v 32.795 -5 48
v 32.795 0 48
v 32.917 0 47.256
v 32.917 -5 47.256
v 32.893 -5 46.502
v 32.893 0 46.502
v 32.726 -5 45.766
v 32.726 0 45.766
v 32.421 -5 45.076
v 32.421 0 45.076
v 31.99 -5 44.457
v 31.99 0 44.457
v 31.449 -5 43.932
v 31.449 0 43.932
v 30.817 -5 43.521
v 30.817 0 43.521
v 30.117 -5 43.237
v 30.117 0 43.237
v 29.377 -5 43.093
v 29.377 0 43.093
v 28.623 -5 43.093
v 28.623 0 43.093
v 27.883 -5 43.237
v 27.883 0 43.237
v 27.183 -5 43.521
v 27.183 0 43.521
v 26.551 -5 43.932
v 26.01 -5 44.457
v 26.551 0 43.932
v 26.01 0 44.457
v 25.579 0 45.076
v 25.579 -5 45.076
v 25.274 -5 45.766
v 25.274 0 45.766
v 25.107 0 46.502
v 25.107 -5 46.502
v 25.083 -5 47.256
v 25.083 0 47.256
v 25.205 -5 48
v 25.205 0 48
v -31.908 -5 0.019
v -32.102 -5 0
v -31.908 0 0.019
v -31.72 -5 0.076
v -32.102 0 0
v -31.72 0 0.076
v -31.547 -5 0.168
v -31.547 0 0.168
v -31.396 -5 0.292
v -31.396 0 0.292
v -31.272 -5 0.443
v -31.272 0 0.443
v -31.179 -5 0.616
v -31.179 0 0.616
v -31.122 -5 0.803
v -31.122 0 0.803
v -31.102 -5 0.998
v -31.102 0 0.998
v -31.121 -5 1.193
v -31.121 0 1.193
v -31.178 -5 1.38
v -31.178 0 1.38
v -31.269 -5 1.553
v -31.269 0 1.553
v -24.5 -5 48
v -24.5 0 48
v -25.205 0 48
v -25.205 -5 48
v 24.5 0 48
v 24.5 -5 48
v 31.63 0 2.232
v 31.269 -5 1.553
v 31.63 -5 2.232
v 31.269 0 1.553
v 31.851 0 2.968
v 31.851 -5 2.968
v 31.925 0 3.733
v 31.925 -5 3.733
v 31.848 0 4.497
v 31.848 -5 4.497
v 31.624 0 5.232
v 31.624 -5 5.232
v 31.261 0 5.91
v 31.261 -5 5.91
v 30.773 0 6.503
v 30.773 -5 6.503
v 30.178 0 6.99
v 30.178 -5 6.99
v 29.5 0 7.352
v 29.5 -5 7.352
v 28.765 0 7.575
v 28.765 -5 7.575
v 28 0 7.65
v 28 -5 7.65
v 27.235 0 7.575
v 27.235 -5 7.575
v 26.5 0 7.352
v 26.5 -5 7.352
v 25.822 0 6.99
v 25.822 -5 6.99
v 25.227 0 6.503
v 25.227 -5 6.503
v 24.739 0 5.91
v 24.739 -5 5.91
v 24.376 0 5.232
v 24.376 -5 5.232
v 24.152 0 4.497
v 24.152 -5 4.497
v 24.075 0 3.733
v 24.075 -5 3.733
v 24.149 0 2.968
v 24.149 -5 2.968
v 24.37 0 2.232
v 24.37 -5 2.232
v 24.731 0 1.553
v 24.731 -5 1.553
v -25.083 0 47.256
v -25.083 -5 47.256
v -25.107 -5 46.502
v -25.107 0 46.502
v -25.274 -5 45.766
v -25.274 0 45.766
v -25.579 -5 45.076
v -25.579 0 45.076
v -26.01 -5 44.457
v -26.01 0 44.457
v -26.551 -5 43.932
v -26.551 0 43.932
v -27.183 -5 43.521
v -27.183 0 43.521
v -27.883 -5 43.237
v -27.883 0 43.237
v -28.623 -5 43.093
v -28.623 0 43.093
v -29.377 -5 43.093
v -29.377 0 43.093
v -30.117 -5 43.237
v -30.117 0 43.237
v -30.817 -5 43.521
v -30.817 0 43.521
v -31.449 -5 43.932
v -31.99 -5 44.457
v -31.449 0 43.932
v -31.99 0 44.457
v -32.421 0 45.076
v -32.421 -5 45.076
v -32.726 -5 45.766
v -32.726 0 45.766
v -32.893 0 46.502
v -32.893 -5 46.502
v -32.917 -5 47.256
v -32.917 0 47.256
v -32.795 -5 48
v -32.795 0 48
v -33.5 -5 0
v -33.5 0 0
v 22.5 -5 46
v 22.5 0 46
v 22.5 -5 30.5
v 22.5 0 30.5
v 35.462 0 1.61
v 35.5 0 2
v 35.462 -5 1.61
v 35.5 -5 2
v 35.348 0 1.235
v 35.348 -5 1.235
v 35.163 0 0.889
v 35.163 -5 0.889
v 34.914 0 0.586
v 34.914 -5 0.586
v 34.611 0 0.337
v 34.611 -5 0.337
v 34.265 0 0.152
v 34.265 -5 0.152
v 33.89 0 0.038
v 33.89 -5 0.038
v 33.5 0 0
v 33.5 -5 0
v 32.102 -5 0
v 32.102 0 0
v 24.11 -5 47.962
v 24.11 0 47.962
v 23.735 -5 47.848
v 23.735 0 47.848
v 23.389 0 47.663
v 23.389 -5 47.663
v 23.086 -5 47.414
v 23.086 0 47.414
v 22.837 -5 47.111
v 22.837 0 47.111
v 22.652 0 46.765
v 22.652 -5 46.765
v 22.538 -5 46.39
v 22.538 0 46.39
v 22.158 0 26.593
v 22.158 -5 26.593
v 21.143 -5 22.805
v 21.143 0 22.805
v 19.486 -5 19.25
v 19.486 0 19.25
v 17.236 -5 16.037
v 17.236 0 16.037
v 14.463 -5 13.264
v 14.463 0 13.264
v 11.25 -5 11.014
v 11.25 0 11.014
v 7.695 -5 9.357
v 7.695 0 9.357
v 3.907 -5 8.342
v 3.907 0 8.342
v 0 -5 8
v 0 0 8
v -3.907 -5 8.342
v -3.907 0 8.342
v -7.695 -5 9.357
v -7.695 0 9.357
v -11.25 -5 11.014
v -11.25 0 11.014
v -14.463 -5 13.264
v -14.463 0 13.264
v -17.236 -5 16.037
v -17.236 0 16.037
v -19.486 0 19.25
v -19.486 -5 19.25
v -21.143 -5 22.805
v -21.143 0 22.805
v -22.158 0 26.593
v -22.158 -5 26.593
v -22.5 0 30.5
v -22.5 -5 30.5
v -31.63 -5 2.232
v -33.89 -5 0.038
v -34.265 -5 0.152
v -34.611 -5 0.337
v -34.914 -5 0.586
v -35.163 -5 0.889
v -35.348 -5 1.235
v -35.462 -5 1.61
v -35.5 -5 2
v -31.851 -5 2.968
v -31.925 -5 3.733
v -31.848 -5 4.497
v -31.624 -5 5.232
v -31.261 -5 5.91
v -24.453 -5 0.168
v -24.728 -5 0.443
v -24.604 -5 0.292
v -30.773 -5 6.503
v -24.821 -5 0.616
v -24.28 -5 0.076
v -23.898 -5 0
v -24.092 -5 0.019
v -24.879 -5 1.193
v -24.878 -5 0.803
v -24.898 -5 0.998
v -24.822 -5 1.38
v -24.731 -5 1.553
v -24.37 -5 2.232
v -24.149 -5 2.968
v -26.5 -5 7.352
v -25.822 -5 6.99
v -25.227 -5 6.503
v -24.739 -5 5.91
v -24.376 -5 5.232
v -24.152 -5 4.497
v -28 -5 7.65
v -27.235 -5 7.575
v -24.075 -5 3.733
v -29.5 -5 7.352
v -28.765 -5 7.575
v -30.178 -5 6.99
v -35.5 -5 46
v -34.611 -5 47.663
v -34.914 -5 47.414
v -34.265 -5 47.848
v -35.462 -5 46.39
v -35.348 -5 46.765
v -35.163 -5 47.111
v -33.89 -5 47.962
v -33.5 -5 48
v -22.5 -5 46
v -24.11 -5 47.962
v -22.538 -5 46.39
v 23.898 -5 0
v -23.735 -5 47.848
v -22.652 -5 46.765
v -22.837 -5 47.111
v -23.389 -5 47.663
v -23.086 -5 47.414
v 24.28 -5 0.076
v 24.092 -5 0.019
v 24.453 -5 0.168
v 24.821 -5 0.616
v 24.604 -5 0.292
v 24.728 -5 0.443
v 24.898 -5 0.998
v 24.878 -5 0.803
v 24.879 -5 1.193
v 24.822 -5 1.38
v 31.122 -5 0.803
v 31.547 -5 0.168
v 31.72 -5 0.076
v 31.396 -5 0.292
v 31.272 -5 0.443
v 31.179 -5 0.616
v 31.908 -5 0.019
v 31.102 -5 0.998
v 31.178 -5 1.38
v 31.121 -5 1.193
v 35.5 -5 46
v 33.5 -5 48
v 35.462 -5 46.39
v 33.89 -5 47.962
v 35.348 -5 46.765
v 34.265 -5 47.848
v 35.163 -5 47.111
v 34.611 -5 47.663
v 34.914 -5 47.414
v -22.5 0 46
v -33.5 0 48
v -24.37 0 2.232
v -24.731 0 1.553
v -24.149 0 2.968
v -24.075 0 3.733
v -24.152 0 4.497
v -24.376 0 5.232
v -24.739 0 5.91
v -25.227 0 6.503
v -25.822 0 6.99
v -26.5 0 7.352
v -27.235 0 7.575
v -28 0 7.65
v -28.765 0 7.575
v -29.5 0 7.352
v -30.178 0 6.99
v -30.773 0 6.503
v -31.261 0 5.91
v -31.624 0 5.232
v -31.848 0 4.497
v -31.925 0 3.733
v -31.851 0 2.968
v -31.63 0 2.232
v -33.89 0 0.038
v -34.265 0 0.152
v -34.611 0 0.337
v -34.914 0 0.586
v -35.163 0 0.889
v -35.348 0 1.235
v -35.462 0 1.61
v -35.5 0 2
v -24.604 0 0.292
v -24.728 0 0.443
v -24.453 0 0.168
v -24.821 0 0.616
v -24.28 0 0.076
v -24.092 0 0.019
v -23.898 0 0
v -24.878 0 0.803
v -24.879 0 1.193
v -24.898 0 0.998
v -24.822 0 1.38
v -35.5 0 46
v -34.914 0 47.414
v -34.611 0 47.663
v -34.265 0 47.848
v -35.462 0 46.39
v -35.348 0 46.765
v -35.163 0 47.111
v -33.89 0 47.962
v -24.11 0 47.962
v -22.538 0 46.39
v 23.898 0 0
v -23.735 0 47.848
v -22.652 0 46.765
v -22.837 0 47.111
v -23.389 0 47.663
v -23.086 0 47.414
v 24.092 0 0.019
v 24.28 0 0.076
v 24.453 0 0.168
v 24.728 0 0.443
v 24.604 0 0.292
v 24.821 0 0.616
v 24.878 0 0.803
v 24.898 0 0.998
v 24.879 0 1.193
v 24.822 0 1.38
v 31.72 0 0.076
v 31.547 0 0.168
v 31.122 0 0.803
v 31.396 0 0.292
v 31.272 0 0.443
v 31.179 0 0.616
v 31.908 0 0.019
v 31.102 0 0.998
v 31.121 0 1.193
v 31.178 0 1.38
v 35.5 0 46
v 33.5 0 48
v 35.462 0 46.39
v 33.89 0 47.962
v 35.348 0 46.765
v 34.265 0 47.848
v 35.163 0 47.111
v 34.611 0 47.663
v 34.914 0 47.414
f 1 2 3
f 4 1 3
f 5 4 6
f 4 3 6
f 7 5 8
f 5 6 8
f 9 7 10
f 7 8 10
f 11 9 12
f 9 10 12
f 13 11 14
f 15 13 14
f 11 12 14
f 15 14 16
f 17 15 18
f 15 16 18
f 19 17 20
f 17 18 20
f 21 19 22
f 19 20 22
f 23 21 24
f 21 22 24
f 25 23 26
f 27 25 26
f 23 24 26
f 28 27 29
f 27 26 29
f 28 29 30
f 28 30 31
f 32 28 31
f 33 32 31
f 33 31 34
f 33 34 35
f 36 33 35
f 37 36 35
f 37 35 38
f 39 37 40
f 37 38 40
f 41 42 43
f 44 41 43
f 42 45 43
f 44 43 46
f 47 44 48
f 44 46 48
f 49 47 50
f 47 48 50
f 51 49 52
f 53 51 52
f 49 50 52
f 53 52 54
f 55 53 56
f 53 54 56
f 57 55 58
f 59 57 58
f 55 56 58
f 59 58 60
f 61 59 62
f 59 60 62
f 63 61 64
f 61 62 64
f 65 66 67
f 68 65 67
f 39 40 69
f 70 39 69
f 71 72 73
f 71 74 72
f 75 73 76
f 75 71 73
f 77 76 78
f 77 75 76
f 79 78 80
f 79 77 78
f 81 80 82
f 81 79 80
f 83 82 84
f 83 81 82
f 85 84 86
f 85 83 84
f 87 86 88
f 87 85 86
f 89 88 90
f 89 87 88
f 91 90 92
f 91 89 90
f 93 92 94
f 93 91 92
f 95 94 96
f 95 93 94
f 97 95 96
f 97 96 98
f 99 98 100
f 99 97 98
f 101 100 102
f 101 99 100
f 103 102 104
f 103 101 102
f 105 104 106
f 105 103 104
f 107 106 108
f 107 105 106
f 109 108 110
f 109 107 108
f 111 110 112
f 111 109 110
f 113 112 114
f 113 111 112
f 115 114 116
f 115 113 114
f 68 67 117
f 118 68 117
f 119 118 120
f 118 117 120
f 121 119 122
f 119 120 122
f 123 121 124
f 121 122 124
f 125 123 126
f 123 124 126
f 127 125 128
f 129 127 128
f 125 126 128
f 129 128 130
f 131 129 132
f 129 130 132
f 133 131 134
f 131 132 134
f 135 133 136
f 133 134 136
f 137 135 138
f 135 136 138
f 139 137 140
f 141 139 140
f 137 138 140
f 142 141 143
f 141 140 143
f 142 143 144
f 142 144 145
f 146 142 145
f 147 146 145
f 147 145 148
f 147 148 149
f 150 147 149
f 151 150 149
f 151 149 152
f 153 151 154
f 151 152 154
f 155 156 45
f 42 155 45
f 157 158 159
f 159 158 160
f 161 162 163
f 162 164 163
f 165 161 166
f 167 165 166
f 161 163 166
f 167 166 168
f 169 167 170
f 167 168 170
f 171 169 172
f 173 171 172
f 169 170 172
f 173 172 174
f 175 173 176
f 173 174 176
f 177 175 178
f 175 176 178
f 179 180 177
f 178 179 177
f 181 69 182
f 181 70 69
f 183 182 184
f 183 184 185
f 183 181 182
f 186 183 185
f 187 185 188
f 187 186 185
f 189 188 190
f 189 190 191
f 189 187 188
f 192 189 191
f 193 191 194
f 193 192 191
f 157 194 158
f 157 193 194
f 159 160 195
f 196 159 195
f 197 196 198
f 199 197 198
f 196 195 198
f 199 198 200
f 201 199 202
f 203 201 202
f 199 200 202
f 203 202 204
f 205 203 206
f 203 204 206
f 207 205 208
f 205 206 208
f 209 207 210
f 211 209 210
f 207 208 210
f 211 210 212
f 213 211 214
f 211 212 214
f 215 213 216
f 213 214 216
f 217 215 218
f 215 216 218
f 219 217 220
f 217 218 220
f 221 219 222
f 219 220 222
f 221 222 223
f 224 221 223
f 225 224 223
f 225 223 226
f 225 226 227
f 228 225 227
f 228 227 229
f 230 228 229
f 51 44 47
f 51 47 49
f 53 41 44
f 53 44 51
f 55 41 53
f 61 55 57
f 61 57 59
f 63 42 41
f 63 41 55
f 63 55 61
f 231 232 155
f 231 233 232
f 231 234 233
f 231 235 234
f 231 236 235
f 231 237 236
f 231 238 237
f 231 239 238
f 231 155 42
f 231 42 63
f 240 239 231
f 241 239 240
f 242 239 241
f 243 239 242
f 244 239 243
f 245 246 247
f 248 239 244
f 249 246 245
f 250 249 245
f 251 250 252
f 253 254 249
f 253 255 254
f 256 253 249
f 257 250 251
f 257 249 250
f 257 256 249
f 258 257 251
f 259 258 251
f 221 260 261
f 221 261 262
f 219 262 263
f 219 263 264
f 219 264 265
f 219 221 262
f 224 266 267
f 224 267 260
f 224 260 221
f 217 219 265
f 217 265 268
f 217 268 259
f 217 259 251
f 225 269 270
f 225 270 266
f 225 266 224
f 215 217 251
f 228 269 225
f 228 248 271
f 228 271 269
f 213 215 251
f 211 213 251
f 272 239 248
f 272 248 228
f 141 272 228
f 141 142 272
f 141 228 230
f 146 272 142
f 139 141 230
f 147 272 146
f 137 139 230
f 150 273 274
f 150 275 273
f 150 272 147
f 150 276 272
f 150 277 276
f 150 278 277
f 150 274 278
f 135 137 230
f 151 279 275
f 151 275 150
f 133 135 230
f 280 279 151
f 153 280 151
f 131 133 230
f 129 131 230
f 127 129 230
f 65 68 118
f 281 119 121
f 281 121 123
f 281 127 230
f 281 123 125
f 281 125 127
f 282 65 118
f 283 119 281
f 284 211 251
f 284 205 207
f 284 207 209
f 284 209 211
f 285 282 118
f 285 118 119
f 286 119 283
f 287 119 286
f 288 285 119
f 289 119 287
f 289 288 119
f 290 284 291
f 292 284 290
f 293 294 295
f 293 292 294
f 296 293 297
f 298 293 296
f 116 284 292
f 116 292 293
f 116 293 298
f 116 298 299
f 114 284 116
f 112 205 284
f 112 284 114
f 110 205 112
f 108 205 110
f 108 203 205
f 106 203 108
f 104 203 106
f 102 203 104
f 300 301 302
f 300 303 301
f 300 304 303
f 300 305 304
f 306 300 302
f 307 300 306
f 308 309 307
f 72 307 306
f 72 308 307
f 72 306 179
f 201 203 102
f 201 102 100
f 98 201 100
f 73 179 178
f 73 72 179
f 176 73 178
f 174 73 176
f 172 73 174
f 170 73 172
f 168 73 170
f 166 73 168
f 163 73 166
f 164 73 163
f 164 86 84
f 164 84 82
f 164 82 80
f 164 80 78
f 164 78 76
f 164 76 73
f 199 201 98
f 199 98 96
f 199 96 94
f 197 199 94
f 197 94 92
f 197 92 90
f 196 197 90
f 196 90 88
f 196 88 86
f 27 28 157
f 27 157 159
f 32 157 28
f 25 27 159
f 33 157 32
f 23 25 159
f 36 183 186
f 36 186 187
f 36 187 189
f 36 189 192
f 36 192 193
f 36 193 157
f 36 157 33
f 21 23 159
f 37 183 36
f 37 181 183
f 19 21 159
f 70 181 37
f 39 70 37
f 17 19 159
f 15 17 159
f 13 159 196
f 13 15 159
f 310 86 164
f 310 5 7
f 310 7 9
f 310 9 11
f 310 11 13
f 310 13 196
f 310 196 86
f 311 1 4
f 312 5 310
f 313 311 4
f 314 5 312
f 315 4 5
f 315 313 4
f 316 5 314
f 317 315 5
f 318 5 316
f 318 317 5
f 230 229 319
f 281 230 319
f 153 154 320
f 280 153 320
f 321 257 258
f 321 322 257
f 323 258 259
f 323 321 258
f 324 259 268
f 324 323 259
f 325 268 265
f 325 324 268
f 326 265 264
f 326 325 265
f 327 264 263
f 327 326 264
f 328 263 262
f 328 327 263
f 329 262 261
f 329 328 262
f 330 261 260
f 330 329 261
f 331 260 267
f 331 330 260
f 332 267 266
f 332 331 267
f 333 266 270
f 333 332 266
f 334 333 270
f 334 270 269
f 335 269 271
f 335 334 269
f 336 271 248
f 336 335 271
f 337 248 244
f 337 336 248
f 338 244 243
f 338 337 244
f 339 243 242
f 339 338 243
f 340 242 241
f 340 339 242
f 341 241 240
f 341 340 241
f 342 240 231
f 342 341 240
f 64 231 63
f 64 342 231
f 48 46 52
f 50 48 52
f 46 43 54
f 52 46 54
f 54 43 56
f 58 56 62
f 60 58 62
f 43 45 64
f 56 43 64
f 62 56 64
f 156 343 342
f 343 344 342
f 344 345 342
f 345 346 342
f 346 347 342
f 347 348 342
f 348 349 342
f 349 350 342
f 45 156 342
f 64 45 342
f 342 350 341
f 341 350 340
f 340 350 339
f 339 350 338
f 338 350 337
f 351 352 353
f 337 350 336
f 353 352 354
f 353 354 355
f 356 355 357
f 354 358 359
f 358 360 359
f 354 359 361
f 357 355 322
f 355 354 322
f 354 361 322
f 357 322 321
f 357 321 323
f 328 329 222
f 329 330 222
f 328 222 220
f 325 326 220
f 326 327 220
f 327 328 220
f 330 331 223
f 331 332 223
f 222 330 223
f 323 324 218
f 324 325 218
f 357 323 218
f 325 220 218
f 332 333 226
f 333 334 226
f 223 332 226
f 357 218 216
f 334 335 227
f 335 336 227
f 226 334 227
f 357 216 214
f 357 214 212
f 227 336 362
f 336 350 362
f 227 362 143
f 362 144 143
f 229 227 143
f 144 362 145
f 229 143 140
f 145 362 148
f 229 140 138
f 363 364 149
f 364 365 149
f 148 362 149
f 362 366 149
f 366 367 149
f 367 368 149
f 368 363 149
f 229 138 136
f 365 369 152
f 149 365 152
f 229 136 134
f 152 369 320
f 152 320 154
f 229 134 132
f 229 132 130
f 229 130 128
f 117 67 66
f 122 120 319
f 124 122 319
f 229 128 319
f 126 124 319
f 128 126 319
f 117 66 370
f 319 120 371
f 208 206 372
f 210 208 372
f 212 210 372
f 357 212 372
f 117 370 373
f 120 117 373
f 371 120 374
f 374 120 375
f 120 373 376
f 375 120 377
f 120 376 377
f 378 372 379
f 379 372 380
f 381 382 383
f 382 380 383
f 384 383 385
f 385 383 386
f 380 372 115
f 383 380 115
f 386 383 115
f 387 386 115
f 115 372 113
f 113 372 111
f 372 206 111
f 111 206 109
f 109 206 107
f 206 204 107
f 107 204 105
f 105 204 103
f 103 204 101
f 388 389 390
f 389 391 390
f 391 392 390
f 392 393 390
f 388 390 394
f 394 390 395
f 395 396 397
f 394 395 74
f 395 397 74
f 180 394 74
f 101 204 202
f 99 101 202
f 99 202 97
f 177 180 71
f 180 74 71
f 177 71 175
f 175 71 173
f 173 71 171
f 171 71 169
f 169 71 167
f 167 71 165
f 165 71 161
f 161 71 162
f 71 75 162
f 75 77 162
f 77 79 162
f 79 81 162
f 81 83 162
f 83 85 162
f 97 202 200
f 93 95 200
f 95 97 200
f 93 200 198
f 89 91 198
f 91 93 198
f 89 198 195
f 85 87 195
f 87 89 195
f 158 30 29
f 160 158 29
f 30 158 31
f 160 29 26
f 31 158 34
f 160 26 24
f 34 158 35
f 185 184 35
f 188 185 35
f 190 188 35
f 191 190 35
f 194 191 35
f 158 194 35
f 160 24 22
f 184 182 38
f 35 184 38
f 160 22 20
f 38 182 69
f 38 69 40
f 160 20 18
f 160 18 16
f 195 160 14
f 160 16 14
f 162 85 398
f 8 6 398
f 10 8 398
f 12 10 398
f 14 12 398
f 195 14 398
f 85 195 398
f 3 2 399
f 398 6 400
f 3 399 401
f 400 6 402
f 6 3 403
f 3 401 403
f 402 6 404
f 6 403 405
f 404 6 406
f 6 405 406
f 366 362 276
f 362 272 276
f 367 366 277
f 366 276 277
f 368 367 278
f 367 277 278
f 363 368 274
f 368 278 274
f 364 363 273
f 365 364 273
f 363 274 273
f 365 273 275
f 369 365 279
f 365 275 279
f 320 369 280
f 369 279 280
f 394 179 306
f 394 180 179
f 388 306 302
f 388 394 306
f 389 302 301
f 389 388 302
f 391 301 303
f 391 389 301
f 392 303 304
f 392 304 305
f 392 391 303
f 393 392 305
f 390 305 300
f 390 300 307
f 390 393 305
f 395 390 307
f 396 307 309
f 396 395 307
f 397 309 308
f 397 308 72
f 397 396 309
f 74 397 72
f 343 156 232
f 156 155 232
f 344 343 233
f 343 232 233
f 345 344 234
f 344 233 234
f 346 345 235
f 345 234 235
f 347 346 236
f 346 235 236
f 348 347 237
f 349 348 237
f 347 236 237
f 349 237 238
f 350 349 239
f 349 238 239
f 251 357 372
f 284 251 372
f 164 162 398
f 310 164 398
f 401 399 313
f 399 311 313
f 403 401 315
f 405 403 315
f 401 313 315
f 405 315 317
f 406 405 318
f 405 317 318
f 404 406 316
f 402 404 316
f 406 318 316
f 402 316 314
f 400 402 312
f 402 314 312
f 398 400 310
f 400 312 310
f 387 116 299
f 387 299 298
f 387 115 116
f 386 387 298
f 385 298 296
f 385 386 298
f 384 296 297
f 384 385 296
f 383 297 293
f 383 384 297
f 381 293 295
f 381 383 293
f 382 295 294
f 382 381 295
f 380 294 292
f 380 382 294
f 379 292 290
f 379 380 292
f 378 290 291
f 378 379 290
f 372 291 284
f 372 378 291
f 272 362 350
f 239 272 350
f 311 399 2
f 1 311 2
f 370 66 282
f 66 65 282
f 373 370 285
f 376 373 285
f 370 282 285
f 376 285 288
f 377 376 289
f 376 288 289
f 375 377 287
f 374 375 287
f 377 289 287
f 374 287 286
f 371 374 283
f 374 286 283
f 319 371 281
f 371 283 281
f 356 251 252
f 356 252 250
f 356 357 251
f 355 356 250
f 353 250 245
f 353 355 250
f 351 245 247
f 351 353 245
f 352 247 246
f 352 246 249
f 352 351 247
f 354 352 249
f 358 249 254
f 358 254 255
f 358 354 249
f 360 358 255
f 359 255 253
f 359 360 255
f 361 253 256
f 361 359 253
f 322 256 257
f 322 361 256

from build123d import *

# Parameters (mm, degrees)
F1_DEPTH = 5
F2_R     = 3.925
F3_DEPTH = 5.001
F4_R     = 2
F5_R     = 1


with BuildPart() as f1:
    # F0 (on Front) → F1 (new body)
    with BuildSketch(Plane.XZ):
        with BuildLine():
            ThreePointArc((22.5, 30.5), (0, 8), (-22.5, 30.5))
            Line((-22.5, 30.5), (-22.5, 48))
            Line((-22.5, 48), (-25.2045257213, 48))
            ThreePointArc((-25.2045257213, 48), (-29, 43.075), (-32.7954742787, 48))
            Line((-32.7954742787, 48), (-35.5, 48))
            Line((-35.5, 48), (-35.5, 0))
            Line((-35.5, 0), (35.5, 0))
            Line((35.5, 0), (35.5, 48))
            Line((35.5, 48), (32.7954742787, 48))
            ThreePointArc((32.7954742787, 48), (29, 43.075), (25.2045257213, 48))
            Line((25.2045257213, 48), (22.5, 48))
            Line((22.5, 48), (22.5, 30.5))
        make_face()
    extrude(amount=F1_DEPTH)

    # F2 (on Front) → F3 (cut, through all)
    with BuildSketch(Plane.XZ):
        with Locations((-28, 3.725)):
            Circle(F2_R)
        with Locations((28, 3.725)):
            Circle(F2_R)
    extrude(amount=F3_DEPTH, mode=Mode.SUBTRACT)

    # F4
    f4_edges = [f1.edges().sort_by_distance(p)[0] for p in [
        (-22.5, -2.5, 48),
        (22.5, -2.5, 48),
        (-35.5, -2.5, 48),
        (35.5, -2.5, 48),
        (35.5, -2.5, 0),
        (-35.5, -2.5, 0),
    ]]
    fillet(f4_edges, radius=F4_R)

    # F5
    f5_edges = [f1.edges().sort_by_distance(p)[0] for p in [
        (-26.763068, -2.5, 0),
        (-29.236932, -2.5, 0),
        (29.236932, -2.5, 0),
        (26.763068, -2.5, 0),
    ]]
    fillet(f5_edges, radius=F5_R)


solid = f1.part
